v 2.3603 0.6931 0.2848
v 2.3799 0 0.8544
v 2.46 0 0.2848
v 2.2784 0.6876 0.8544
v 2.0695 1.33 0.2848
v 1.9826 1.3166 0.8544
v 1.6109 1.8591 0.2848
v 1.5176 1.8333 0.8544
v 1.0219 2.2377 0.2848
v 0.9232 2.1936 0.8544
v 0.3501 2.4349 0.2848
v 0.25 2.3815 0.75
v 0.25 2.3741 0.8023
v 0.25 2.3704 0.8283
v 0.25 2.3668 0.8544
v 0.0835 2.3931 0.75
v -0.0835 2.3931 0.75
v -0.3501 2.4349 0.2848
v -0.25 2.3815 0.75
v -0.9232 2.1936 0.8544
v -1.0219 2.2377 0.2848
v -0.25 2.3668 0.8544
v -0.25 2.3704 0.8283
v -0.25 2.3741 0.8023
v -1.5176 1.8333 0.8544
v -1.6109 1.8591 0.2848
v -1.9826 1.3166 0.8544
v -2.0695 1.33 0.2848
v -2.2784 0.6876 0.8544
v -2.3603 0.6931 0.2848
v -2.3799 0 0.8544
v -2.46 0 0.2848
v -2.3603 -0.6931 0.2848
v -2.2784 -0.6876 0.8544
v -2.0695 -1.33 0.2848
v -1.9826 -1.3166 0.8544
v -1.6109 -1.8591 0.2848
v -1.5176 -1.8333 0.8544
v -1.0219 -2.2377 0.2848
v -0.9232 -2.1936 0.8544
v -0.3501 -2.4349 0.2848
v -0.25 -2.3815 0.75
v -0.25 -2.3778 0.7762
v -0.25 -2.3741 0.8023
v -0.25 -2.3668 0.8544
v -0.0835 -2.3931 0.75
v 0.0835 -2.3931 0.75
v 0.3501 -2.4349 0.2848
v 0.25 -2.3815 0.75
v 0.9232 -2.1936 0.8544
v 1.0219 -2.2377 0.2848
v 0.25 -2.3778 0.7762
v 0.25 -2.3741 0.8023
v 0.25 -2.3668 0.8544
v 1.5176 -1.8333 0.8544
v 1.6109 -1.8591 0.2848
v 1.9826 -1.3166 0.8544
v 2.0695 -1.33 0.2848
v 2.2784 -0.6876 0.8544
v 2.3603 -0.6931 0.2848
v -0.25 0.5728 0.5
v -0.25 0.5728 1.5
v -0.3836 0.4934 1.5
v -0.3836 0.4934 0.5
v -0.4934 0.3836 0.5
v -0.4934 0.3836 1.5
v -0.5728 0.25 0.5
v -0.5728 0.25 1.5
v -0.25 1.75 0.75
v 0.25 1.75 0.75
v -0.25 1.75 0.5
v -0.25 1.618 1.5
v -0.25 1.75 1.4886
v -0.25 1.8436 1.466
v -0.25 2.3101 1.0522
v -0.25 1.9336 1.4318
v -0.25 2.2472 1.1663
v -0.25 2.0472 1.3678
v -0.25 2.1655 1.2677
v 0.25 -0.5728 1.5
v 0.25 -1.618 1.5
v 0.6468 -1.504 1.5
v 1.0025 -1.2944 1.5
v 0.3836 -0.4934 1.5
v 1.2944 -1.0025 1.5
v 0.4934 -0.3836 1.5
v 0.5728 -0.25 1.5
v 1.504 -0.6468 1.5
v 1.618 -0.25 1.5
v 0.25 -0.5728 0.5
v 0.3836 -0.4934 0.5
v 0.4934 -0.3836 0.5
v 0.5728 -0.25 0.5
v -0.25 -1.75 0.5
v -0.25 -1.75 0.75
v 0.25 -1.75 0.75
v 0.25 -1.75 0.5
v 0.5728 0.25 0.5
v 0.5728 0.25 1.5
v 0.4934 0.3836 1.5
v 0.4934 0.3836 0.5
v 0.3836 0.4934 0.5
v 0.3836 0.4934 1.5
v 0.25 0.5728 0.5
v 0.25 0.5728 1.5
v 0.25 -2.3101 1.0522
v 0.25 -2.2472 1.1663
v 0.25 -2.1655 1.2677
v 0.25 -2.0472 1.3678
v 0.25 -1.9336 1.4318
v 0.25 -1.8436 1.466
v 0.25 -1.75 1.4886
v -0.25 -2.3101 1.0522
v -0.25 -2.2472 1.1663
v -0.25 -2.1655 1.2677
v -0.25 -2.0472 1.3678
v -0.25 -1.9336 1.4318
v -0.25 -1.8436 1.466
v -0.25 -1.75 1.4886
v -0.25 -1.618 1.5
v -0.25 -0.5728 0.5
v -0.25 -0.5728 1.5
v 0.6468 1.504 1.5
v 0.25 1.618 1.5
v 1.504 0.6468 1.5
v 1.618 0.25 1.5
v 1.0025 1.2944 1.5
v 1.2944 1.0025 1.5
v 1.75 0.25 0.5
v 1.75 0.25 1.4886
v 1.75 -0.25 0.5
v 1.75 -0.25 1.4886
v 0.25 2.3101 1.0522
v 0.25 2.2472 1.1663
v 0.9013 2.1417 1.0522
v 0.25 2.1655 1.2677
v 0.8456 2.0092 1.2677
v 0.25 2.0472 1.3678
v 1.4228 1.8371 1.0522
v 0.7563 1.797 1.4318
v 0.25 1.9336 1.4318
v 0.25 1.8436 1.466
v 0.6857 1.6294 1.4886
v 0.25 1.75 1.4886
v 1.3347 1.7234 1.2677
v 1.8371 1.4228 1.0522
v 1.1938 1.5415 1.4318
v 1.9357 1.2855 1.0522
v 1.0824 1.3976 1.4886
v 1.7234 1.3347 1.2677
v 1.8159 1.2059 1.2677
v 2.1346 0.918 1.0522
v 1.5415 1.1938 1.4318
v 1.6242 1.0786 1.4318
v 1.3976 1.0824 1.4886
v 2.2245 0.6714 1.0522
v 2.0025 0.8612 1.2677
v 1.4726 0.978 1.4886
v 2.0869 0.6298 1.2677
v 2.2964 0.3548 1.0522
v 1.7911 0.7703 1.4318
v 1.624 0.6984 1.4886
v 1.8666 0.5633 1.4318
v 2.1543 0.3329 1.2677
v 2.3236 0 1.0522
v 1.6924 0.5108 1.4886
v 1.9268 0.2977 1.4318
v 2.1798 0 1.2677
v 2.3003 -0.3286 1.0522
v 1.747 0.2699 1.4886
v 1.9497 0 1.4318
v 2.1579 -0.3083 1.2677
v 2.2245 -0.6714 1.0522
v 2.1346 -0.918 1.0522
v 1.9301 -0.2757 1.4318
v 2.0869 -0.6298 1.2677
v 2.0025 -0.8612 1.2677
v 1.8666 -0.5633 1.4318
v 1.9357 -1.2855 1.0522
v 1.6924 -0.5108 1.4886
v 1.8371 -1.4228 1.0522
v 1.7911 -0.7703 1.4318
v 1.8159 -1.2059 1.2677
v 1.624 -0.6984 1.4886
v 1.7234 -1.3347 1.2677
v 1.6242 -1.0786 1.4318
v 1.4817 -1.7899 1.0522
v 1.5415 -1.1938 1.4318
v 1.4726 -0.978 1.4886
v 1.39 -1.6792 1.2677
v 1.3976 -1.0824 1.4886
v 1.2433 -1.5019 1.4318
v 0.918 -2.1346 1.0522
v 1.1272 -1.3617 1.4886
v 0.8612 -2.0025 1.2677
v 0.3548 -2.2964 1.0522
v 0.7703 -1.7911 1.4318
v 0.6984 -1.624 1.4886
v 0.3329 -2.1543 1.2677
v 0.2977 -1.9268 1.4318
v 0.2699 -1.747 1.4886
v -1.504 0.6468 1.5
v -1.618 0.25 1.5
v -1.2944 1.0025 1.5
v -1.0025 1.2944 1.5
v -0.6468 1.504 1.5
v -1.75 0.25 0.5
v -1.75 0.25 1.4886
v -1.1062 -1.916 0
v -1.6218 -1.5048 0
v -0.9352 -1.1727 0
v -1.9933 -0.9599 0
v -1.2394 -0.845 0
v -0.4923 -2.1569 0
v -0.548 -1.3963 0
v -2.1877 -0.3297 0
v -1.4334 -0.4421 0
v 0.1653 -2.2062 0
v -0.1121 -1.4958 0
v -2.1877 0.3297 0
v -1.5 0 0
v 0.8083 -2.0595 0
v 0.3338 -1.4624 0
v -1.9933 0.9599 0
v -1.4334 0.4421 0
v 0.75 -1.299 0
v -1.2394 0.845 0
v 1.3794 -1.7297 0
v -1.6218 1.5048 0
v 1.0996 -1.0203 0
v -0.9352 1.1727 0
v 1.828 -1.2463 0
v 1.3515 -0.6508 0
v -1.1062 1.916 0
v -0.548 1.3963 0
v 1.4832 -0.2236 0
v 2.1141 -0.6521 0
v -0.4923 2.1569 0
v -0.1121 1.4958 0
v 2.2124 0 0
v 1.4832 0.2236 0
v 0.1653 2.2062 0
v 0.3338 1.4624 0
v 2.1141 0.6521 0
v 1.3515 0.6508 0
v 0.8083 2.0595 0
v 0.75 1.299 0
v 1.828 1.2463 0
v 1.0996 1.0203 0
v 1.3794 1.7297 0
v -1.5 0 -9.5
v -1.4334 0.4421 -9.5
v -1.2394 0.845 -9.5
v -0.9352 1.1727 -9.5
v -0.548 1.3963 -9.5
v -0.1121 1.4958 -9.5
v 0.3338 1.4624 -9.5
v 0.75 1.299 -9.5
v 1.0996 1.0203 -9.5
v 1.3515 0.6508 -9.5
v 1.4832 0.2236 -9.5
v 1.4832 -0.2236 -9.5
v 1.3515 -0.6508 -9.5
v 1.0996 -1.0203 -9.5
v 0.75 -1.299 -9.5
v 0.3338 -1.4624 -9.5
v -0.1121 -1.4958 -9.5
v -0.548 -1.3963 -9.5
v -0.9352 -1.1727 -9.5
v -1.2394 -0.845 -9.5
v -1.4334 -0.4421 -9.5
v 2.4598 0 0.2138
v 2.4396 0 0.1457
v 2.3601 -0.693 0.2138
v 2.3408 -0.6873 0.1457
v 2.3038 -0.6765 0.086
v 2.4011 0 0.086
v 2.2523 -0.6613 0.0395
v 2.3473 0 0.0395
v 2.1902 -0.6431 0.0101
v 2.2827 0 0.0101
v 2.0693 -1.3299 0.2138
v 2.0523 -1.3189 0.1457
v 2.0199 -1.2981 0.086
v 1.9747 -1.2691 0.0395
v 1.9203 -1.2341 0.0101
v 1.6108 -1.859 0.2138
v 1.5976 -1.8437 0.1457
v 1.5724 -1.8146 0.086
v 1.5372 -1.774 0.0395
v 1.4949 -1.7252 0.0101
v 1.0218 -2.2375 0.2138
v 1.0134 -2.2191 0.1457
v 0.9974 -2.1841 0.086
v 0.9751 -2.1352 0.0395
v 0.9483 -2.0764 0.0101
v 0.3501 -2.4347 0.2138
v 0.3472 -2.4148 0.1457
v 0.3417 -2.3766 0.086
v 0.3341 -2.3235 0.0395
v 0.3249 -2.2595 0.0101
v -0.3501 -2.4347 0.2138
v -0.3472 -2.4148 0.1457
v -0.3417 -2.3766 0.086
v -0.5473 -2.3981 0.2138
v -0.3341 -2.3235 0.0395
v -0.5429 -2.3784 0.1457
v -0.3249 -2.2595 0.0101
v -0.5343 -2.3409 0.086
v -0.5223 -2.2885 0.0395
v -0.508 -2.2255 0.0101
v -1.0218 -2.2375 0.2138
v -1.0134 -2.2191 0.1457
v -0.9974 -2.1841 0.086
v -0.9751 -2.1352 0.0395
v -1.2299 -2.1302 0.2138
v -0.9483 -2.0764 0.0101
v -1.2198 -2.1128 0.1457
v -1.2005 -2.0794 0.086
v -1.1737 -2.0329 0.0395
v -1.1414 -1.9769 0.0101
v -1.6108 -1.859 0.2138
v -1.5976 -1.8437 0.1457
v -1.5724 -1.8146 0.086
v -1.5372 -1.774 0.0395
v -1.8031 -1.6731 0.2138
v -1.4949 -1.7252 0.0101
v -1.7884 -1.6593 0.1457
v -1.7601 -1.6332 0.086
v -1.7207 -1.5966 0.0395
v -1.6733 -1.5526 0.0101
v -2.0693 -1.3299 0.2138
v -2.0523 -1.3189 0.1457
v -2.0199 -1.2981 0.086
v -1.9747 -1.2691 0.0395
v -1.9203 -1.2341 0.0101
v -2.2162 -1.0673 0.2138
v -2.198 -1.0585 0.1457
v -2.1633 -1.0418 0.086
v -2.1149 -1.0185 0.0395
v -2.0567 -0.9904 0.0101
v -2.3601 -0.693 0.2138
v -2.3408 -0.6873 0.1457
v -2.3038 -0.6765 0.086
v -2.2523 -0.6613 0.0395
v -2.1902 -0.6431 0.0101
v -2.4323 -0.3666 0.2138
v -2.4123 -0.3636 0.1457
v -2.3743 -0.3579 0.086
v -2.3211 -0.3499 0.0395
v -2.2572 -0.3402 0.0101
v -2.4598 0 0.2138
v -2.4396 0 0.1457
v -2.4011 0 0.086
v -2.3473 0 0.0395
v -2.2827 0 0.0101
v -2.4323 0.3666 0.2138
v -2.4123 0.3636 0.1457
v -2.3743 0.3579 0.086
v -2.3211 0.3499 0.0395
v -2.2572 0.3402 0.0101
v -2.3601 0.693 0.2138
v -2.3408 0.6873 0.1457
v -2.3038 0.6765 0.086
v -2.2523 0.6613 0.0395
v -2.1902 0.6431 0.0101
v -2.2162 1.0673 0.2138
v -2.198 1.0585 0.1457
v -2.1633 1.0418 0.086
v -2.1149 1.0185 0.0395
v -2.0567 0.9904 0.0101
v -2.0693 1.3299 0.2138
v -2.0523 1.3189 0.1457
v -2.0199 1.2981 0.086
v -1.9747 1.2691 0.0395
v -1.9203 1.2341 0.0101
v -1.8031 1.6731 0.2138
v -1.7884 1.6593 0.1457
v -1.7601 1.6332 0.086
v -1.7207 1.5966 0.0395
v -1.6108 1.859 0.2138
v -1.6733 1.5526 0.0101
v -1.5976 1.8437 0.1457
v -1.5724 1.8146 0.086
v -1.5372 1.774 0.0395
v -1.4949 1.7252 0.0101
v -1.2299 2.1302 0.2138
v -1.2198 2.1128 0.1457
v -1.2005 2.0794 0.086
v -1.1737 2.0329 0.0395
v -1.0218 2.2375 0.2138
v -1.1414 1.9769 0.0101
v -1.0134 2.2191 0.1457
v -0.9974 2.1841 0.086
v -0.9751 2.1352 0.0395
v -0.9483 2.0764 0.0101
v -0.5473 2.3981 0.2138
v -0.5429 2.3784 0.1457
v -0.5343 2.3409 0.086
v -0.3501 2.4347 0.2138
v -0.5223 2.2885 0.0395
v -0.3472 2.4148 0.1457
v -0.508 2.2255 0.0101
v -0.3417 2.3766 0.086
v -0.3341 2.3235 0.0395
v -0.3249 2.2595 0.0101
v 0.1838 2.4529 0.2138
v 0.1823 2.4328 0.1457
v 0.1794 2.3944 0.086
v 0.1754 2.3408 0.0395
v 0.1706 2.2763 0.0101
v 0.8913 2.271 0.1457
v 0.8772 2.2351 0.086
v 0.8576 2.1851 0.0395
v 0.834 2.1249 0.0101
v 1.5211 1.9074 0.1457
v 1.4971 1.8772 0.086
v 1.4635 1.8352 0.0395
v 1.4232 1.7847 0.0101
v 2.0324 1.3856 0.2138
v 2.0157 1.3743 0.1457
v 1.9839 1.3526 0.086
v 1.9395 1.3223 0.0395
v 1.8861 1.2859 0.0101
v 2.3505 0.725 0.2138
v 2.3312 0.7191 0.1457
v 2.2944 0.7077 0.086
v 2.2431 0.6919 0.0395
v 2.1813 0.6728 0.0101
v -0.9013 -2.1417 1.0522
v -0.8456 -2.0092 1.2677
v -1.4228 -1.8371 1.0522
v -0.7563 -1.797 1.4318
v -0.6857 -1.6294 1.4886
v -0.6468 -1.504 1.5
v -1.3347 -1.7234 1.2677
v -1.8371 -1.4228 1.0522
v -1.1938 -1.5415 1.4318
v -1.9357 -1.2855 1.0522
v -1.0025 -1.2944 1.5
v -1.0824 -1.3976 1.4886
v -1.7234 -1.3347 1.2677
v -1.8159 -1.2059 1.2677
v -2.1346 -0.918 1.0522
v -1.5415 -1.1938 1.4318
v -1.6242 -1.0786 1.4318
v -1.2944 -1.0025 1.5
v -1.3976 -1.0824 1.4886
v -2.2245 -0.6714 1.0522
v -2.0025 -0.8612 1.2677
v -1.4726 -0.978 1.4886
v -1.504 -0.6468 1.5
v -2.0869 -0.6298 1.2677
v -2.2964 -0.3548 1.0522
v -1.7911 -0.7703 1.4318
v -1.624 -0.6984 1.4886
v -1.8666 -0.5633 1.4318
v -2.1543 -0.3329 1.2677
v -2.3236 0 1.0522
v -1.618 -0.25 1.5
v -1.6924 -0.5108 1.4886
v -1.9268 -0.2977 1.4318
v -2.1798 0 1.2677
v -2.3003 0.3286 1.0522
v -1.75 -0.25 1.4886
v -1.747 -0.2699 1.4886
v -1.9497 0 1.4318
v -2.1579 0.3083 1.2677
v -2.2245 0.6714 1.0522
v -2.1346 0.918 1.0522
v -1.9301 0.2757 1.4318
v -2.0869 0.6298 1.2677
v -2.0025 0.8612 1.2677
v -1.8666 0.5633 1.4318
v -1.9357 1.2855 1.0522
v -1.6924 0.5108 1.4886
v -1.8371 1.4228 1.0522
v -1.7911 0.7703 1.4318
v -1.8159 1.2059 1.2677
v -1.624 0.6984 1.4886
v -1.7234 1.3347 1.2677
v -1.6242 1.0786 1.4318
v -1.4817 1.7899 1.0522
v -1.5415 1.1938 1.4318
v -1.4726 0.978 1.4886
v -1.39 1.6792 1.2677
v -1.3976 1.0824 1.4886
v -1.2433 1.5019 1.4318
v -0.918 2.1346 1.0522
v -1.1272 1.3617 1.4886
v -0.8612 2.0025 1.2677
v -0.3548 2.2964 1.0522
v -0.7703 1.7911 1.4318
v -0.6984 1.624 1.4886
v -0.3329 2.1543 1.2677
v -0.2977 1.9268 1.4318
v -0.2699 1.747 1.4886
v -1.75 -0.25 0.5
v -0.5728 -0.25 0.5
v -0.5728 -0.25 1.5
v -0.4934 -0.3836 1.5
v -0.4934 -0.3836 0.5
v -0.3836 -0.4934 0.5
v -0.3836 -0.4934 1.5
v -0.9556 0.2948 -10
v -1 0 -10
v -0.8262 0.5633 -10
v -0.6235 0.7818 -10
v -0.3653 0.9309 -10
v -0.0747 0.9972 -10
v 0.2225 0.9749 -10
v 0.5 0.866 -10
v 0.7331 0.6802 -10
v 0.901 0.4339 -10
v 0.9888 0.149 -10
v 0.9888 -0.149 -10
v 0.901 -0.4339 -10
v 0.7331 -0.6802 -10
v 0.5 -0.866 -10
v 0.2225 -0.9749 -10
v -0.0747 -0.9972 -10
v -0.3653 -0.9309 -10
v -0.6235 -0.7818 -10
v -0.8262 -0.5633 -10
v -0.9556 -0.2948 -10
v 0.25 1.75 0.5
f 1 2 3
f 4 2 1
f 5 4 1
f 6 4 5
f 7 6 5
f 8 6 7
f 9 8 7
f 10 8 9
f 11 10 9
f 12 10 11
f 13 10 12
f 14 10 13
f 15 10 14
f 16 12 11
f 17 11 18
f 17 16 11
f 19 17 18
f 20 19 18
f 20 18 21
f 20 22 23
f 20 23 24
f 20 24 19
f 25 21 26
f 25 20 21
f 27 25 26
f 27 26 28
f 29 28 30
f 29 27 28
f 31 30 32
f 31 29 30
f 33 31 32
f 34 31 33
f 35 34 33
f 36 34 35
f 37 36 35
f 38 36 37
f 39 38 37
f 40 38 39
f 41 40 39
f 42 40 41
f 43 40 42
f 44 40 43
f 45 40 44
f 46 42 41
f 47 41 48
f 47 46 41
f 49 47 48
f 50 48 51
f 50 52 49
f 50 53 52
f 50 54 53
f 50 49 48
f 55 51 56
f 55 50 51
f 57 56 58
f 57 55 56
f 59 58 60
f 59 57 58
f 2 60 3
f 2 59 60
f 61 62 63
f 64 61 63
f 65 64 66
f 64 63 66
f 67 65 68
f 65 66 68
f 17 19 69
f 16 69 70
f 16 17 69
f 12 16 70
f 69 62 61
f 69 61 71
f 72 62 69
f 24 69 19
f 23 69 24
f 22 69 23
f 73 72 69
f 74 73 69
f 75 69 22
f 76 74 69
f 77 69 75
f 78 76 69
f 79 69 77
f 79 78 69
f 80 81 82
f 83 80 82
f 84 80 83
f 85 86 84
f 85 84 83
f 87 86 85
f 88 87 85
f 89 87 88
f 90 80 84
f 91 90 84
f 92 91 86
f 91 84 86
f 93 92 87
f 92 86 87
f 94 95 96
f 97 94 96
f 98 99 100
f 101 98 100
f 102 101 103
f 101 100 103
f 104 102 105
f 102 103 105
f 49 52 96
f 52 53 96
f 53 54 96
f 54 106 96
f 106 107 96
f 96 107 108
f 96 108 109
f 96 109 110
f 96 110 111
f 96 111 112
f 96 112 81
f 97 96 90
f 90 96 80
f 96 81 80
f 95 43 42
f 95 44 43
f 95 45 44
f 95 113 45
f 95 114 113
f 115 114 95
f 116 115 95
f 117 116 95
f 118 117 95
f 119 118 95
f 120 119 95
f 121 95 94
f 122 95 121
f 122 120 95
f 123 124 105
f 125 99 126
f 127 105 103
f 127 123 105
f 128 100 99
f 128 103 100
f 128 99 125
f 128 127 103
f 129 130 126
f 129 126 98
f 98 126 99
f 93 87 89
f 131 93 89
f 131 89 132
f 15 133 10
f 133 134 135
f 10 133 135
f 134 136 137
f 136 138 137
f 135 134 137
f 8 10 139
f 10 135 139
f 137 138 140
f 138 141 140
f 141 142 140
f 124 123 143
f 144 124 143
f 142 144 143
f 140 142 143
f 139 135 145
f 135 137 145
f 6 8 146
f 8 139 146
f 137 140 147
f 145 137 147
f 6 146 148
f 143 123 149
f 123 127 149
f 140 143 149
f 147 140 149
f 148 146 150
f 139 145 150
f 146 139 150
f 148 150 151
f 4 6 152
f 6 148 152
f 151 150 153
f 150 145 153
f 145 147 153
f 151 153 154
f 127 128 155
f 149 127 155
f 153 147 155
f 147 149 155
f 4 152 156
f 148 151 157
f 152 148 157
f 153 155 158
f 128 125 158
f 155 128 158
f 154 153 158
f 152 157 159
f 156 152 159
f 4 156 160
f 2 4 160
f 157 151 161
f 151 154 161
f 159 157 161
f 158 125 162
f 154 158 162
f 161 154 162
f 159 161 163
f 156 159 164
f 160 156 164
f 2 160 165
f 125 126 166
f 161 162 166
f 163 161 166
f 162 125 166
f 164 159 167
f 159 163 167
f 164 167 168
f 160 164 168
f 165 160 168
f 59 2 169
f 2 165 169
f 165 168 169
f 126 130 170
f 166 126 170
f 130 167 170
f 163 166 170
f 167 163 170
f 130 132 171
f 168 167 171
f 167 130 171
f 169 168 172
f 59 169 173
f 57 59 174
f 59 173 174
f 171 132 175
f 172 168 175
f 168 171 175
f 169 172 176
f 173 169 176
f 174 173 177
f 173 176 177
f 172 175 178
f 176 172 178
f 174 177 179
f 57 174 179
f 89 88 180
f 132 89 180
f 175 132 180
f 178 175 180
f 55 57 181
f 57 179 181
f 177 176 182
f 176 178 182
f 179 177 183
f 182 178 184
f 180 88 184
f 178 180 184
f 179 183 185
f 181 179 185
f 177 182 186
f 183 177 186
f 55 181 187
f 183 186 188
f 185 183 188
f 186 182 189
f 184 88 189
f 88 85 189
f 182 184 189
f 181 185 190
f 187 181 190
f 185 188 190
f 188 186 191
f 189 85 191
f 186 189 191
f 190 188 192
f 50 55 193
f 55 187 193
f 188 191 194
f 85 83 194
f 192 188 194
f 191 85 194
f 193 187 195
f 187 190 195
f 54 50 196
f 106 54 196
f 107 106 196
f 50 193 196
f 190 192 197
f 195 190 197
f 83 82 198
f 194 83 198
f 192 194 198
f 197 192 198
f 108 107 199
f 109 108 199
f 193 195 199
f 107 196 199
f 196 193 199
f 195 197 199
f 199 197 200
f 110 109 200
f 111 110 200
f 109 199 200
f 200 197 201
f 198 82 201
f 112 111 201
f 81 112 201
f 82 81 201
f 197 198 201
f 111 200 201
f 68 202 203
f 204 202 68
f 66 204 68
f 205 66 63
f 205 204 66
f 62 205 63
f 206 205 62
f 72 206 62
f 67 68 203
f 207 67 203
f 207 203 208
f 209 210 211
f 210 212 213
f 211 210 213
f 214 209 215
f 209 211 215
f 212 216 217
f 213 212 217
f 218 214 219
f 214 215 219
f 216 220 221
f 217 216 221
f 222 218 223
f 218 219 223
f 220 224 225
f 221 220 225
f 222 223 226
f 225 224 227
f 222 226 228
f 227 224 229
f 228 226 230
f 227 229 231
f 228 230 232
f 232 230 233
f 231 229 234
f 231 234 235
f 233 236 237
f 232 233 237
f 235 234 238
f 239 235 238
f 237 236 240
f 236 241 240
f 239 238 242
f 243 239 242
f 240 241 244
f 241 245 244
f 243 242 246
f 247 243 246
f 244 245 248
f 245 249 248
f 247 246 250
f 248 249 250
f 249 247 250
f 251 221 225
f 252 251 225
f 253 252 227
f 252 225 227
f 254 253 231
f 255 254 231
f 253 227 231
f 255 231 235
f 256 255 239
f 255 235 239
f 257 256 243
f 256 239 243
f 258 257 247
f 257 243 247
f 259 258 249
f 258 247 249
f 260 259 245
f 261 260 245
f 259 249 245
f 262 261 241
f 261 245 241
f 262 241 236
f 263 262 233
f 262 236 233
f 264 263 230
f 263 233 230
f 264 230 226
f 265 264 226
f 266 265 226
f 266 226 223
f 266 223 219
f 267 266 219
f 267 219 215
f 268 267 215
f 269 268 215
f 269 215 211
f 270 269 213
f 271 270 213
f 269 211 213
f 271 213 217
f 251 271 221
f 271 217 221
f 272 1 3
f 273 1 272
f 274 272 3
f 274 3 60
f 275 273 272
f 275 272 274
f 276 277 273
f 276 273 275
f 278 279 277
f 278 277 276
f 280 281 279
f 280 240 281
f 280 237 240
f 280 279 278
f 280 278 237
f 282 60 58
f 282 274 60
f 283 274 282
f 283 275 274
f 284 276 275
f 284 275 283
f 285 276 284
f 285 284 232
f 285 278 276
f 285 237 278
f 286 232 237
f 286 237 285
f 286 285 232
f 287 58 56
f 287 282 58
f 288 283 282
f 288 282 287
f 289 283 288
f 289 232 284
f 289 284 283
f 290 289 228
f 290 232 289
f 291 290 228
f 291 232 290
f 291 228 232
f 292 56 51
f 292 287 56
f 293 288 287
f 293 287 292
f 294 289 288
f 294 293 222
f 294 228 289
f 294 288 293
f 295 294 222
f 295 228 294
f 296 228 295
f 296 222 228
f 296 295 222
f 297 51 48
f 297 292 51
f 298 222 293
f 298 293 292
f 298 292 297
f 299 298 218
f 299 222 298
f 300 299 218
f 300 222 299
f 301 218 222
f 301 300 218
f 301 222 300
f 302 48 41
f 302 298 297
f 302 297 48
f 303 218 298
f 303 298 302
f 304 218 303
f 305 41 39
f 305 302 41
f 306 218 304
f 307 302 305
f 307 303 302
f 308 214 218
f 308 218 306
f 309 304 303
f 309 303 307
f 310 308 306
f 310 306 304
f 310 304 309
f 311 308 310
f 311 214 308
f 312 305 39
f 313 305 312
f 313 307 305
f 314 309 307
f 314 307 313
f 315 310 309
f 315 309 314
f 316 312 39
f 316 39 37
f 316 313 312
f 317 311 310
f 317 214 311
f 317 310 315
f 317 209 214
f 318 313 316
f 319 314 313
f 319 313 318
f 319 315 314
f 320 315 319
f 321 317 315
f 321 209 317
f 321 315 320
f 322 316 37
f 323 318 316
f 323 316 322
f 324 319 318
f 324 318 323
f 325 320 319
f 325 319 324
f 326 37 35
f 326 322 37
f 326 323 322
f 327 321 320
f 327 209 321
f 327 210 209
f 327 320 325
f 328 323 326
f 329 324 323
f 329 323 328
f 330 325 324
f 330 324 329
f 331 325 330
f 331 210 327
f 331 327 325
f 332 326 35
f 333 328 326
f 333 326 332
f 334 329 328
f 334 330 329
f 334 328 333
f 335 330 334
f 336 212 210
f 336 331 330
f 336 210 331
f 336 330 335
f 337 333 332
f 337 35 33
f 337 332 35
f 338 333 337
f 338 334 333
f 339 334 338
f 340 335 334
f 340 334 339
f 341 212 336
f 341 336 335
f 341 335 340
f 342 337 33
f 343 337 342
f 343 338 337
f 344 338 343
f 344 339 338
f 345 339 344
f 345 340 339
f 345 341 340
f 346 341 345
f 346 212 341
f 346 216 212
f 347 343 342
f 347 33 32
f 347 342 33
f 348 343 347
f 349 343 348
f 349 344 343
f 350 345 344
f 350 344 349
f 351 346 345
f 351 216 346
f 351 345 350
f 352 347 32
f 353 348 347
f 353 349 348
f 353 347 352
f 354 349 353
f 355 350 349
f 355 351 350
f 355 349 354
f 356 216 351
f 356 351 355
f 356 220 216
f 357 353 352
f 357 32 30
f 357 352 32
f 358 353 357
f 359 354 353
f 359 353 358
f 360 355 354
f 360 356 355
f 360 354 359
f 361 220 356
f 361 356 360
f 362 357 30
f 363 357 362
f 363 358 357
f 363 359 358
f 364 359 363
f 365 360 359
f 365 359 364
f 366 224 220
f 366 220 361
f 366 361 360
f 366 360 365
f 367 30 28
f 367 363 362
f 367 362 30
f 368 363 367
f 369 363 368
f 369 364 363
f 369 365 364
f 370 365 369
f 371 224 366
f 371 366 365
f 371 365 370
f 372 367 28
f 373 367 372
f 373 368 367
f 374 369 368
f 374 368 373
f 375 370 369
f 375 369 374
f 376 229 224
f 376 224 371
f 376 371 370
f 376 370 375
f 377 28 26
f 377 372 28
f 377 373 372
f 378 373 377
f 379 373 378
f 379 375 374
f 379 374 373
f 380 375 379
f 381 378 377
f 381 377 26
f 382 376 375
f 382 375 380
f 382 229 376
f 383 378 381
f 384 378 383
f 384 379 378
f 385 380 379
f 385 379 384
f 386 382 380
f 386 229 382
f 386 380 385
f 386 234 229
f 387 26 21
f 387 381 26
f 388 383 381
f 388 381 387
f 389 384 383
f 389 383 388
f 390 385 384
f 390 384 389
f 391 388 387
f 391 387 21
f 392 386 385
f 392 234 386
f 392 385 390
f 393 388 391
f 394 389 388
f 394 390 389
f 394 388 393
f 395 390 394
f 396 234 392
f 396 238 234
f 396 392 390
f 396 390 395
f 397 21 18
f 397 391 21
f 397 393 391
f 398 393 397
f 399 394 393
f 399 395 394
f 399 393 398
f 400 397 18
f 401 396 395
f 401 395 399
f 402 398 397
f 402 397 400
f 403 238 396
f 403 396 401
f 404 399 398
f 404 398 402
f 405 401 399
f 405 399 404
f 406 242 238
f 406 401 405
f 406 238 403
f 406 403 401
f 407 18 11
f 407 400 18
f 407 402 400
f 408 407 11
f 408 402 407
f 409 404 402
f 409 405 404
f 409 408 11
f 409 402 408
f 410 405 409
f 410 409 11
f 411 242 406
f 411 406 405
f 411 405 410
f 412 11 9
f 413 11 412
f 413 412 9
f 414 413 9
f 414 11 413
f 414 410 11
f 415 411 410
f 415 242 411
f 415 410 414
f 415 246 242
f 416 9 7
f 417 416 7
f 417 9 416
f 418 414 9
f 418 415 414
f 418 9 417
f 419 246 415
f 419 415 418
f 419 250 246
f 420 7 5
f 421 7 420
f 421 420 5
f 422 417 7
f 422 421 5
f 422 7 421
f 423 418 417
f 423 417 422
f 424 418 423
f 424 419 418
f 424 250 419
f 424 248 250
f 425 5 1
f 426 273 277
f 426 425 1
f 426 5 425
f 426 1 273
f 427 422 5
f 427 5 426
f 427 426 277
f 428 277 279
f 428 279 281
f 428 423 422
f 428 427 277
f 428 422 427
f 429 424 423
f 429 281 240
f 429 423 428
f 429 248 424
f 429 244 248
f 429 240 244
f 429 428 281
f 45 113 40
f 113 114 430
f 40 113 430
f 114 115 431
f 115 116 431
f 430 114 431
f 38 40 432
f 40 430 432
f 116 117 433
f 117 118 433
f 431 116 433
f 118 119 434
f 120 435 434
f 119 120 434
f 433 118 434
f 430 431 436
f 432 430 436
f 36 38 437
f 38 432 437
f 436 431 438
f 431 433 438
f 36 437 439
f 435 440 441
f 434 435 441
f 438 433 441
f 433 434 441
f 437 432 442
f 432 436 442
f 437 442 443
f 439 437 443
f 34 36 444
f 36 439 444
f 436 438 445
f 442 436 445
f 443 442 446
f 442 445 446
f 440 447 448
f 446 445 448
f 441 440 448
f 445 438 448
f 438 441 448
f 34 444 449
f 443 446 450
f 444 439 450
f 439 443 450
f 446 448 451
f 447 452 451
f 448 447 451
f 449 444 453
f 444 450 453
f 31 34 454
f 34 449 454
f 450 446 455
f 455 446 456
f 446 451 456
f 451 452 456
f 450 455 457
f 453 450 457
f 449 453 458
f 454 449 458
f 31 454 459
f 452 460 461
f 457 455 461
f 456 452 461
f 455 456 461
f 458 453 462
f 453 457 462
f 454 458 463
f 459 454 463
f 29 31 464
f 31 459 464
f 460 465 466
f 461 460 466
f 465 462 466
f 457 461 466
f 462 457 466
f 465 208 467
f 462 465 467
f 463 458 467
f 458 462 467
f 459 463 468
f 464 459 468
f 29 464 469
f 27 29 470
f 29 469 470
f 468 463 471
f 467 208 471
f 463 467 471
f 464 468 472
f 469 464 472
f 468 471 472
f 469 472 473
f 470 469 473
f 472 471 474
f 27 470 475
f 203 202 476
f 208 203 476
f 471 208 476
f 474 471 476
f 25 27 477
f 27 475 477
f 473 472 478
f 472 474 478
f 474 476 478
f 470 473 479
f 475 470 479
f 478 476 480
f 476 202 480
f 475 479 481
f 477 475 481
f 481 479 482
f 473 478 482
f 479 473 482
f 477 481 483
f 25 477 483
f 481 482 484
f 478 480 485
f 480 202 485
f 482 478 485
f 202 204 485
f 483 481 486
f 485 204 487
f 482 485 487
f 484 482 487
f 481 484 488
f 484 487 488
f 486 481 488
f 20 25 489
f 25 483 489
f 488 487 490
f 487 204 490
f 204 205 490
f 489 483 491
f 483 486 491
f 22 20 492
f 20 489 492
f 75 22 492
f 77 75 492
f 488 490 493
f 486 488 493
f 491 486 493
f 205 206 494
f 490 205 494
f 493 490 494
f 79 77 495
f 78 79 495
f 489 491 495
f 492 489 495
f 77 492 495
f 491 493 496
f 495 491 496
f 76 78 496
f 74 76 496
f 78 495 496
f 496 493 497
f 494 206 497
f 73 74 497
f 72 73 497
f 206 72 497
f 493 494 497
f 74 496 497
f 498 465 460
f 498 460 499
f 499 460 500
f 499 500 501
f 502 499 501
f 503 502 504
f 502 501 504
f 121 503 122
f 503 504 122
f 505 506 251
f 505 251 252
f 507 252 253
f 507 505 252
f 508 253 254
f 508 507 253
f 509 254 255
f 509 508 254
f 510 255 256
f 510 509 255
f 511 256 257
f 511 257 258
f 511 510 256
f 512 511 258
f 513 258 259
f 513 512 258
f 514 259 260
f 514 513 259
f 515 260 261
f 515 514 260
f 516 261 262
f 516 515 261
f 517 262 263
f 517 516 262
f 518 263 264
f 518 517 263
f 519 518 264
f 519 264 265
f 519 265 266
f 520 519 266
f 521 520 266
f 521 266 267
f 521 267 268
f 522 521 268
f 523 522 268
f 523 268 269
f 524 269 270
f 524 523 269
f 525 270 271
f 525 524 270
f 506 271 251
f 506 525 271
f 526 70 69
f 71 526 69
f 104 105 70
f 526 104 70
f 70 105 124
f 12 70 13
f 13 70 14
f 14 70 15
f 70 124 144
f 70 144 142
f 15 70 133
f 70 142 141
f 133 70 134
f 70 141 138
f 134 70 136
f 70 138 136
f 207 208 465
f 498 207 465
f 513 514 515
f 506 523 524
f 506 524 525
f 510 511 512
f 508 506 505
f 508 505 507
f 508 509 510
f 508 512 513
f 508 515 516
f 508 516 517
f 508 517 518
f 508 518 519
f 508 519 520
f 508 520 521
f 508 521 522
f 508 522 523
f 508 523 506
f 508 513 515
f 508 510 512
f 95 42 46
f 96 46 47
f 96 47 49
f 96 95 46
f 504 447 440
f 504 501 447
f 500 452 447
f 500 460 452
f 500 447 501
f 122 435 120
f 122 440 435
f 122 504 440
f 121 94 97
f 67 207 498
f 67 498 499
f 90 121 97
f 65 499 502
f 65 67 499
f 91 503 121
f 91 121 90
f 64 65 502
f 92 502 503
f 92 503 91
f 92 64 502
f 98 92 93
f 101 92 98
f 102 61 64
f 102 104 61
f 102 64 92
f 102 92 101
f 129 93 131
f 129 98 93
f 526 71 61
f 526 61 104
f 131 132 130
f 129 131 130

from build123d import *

# Parameters (mm, degrees)
ESQUISSE1_R             = 2.5
BASE_EXTRUSION_DEPTH    = 1.5
BASE_EXTRUSION_TAPER    = 8
CONG_1_R                = 0.75
CONG_2_R                = 0.25
ESQUISSE2_R             = 1.5
BOSS_EXTRU_1_DEPTH      = 10
CHANFREIN1_SIZE         = 0.5
ENL_V_MAT_EXTRU_1_DEPTH = 1
ESQUISSE5_W             = 0.5
ESQUISSE5_H             = 5.000243794
ENL_V_MAT_EXTRU_2_DEPTH = 0.75


with BuildPart() as part:
    # Esquisse1 → Base-Extrusion (new body)
    with BuildSketch(Plane.XY):
        Circle(ESQUISSE1_R)
    extrude(amount=BASE_EXTRUSION_DEPTH, taper=BASE_EXTRUSION_TAPER)

    # Congé1
    cong_1_edges = [part.edges().sort_by_distance(p)[0] for p in [
        (-2.289188748, 0, 1.5),
    ]]
    fillet(cong_1_edges, radius=CONG_1_R)

    # Congé2
    cong_2_edges = [part.edges().sort_by_distance(p)[0] for p in [
        (-2.5, 0, 0),
    ]]
    fillet(cong_2_edges, radius=CONG_2_R)

    # Esquisse2 → Boss.-Extru.1 (add)
    with BuildSketch(Plane(origin=(0, 0, 0), x_dir=(-1, 0, 0), z_dir=(0, 0, -1))):
        Circle(ESQUISSE2_R)
    extrude(amount=BOSS_EXTRU_1_DEPTH)

    # Chanfrein1
    chanfrein1_edges = [part.edges().sort_by_distance(p)[0] for p in [
        (1.5, 0, -10),
    ]]
    chamfer(chanfrein1_edges, length=CHANFREIN1_SIZE)

    # Esquisse4 → Enlèv. mat.-Extru.1 (cut)
    with BuildSketch(Plane.XY.offset(1.5)):
        with BuildLine():
            Line((-0.25, 1.75), (-0.25, 0.572821962))
            ThreePointArc((-0.25, 0.572821962), (-0.441941738, 0.441941738), (-0.572821962, 0.25))
            Line((-0.572821962, 0.25), (-1.75, 0.25))
            Line((-1.75, 0.25), (-1.75, -0.25))
            Line((-1.75, -0.25), (-0.572821962, -0.25))
            ThreePointArc((-0.572821962, -0.25), (-0.441941738, -0.441941738), (-0.25, -0.572821962))
            Line((-0.25, -0.572821962), (-0.25, -1.75))
            Line((-0.25, -1.75), (0.25, -1.75))
            Line((0.25, -1.75), (0.25, -0.572821962))
            ThreePointArc((0.25, -0.572821962), (0.441941738, -0.441941738), (0.572821962, -0.25))
            Line((0.572821962, -0.25), (1.75, -0.25))
            Line((1.75, -0.25), (1.75, 0.25))
            Line((1.75, 0.25), (0.572821962, 0.25))
            ThreePointArc((0.572821962, 0.25), (0.441941738, 0.441941738), (0.25, 0.572821962))
            Line((0.25, 0.572821962), (0.25, 1.75))
            Line((0.25, 1.75), (-0.25, 1.75))
        make_face()
    extrude(amount=-ENL_V_MAT_EXTRU_1_DEPTH, mode=Mode.SUBTRACT)

    # Esquisse5 → Enlèv. mat.-Extru.2 (cut)
    with BuildSketch(Plane.XY.offset(1.5)):
        with Locations((0, 0.01124212)):
            Rectangle(ESQUISSE5_W, ESQUISSE5_H)
    extrude(amount=-ENL_V_MAT_EXTRU_2_DEPTH, mode=Mode.SUBTRACT)


solid = part.part
